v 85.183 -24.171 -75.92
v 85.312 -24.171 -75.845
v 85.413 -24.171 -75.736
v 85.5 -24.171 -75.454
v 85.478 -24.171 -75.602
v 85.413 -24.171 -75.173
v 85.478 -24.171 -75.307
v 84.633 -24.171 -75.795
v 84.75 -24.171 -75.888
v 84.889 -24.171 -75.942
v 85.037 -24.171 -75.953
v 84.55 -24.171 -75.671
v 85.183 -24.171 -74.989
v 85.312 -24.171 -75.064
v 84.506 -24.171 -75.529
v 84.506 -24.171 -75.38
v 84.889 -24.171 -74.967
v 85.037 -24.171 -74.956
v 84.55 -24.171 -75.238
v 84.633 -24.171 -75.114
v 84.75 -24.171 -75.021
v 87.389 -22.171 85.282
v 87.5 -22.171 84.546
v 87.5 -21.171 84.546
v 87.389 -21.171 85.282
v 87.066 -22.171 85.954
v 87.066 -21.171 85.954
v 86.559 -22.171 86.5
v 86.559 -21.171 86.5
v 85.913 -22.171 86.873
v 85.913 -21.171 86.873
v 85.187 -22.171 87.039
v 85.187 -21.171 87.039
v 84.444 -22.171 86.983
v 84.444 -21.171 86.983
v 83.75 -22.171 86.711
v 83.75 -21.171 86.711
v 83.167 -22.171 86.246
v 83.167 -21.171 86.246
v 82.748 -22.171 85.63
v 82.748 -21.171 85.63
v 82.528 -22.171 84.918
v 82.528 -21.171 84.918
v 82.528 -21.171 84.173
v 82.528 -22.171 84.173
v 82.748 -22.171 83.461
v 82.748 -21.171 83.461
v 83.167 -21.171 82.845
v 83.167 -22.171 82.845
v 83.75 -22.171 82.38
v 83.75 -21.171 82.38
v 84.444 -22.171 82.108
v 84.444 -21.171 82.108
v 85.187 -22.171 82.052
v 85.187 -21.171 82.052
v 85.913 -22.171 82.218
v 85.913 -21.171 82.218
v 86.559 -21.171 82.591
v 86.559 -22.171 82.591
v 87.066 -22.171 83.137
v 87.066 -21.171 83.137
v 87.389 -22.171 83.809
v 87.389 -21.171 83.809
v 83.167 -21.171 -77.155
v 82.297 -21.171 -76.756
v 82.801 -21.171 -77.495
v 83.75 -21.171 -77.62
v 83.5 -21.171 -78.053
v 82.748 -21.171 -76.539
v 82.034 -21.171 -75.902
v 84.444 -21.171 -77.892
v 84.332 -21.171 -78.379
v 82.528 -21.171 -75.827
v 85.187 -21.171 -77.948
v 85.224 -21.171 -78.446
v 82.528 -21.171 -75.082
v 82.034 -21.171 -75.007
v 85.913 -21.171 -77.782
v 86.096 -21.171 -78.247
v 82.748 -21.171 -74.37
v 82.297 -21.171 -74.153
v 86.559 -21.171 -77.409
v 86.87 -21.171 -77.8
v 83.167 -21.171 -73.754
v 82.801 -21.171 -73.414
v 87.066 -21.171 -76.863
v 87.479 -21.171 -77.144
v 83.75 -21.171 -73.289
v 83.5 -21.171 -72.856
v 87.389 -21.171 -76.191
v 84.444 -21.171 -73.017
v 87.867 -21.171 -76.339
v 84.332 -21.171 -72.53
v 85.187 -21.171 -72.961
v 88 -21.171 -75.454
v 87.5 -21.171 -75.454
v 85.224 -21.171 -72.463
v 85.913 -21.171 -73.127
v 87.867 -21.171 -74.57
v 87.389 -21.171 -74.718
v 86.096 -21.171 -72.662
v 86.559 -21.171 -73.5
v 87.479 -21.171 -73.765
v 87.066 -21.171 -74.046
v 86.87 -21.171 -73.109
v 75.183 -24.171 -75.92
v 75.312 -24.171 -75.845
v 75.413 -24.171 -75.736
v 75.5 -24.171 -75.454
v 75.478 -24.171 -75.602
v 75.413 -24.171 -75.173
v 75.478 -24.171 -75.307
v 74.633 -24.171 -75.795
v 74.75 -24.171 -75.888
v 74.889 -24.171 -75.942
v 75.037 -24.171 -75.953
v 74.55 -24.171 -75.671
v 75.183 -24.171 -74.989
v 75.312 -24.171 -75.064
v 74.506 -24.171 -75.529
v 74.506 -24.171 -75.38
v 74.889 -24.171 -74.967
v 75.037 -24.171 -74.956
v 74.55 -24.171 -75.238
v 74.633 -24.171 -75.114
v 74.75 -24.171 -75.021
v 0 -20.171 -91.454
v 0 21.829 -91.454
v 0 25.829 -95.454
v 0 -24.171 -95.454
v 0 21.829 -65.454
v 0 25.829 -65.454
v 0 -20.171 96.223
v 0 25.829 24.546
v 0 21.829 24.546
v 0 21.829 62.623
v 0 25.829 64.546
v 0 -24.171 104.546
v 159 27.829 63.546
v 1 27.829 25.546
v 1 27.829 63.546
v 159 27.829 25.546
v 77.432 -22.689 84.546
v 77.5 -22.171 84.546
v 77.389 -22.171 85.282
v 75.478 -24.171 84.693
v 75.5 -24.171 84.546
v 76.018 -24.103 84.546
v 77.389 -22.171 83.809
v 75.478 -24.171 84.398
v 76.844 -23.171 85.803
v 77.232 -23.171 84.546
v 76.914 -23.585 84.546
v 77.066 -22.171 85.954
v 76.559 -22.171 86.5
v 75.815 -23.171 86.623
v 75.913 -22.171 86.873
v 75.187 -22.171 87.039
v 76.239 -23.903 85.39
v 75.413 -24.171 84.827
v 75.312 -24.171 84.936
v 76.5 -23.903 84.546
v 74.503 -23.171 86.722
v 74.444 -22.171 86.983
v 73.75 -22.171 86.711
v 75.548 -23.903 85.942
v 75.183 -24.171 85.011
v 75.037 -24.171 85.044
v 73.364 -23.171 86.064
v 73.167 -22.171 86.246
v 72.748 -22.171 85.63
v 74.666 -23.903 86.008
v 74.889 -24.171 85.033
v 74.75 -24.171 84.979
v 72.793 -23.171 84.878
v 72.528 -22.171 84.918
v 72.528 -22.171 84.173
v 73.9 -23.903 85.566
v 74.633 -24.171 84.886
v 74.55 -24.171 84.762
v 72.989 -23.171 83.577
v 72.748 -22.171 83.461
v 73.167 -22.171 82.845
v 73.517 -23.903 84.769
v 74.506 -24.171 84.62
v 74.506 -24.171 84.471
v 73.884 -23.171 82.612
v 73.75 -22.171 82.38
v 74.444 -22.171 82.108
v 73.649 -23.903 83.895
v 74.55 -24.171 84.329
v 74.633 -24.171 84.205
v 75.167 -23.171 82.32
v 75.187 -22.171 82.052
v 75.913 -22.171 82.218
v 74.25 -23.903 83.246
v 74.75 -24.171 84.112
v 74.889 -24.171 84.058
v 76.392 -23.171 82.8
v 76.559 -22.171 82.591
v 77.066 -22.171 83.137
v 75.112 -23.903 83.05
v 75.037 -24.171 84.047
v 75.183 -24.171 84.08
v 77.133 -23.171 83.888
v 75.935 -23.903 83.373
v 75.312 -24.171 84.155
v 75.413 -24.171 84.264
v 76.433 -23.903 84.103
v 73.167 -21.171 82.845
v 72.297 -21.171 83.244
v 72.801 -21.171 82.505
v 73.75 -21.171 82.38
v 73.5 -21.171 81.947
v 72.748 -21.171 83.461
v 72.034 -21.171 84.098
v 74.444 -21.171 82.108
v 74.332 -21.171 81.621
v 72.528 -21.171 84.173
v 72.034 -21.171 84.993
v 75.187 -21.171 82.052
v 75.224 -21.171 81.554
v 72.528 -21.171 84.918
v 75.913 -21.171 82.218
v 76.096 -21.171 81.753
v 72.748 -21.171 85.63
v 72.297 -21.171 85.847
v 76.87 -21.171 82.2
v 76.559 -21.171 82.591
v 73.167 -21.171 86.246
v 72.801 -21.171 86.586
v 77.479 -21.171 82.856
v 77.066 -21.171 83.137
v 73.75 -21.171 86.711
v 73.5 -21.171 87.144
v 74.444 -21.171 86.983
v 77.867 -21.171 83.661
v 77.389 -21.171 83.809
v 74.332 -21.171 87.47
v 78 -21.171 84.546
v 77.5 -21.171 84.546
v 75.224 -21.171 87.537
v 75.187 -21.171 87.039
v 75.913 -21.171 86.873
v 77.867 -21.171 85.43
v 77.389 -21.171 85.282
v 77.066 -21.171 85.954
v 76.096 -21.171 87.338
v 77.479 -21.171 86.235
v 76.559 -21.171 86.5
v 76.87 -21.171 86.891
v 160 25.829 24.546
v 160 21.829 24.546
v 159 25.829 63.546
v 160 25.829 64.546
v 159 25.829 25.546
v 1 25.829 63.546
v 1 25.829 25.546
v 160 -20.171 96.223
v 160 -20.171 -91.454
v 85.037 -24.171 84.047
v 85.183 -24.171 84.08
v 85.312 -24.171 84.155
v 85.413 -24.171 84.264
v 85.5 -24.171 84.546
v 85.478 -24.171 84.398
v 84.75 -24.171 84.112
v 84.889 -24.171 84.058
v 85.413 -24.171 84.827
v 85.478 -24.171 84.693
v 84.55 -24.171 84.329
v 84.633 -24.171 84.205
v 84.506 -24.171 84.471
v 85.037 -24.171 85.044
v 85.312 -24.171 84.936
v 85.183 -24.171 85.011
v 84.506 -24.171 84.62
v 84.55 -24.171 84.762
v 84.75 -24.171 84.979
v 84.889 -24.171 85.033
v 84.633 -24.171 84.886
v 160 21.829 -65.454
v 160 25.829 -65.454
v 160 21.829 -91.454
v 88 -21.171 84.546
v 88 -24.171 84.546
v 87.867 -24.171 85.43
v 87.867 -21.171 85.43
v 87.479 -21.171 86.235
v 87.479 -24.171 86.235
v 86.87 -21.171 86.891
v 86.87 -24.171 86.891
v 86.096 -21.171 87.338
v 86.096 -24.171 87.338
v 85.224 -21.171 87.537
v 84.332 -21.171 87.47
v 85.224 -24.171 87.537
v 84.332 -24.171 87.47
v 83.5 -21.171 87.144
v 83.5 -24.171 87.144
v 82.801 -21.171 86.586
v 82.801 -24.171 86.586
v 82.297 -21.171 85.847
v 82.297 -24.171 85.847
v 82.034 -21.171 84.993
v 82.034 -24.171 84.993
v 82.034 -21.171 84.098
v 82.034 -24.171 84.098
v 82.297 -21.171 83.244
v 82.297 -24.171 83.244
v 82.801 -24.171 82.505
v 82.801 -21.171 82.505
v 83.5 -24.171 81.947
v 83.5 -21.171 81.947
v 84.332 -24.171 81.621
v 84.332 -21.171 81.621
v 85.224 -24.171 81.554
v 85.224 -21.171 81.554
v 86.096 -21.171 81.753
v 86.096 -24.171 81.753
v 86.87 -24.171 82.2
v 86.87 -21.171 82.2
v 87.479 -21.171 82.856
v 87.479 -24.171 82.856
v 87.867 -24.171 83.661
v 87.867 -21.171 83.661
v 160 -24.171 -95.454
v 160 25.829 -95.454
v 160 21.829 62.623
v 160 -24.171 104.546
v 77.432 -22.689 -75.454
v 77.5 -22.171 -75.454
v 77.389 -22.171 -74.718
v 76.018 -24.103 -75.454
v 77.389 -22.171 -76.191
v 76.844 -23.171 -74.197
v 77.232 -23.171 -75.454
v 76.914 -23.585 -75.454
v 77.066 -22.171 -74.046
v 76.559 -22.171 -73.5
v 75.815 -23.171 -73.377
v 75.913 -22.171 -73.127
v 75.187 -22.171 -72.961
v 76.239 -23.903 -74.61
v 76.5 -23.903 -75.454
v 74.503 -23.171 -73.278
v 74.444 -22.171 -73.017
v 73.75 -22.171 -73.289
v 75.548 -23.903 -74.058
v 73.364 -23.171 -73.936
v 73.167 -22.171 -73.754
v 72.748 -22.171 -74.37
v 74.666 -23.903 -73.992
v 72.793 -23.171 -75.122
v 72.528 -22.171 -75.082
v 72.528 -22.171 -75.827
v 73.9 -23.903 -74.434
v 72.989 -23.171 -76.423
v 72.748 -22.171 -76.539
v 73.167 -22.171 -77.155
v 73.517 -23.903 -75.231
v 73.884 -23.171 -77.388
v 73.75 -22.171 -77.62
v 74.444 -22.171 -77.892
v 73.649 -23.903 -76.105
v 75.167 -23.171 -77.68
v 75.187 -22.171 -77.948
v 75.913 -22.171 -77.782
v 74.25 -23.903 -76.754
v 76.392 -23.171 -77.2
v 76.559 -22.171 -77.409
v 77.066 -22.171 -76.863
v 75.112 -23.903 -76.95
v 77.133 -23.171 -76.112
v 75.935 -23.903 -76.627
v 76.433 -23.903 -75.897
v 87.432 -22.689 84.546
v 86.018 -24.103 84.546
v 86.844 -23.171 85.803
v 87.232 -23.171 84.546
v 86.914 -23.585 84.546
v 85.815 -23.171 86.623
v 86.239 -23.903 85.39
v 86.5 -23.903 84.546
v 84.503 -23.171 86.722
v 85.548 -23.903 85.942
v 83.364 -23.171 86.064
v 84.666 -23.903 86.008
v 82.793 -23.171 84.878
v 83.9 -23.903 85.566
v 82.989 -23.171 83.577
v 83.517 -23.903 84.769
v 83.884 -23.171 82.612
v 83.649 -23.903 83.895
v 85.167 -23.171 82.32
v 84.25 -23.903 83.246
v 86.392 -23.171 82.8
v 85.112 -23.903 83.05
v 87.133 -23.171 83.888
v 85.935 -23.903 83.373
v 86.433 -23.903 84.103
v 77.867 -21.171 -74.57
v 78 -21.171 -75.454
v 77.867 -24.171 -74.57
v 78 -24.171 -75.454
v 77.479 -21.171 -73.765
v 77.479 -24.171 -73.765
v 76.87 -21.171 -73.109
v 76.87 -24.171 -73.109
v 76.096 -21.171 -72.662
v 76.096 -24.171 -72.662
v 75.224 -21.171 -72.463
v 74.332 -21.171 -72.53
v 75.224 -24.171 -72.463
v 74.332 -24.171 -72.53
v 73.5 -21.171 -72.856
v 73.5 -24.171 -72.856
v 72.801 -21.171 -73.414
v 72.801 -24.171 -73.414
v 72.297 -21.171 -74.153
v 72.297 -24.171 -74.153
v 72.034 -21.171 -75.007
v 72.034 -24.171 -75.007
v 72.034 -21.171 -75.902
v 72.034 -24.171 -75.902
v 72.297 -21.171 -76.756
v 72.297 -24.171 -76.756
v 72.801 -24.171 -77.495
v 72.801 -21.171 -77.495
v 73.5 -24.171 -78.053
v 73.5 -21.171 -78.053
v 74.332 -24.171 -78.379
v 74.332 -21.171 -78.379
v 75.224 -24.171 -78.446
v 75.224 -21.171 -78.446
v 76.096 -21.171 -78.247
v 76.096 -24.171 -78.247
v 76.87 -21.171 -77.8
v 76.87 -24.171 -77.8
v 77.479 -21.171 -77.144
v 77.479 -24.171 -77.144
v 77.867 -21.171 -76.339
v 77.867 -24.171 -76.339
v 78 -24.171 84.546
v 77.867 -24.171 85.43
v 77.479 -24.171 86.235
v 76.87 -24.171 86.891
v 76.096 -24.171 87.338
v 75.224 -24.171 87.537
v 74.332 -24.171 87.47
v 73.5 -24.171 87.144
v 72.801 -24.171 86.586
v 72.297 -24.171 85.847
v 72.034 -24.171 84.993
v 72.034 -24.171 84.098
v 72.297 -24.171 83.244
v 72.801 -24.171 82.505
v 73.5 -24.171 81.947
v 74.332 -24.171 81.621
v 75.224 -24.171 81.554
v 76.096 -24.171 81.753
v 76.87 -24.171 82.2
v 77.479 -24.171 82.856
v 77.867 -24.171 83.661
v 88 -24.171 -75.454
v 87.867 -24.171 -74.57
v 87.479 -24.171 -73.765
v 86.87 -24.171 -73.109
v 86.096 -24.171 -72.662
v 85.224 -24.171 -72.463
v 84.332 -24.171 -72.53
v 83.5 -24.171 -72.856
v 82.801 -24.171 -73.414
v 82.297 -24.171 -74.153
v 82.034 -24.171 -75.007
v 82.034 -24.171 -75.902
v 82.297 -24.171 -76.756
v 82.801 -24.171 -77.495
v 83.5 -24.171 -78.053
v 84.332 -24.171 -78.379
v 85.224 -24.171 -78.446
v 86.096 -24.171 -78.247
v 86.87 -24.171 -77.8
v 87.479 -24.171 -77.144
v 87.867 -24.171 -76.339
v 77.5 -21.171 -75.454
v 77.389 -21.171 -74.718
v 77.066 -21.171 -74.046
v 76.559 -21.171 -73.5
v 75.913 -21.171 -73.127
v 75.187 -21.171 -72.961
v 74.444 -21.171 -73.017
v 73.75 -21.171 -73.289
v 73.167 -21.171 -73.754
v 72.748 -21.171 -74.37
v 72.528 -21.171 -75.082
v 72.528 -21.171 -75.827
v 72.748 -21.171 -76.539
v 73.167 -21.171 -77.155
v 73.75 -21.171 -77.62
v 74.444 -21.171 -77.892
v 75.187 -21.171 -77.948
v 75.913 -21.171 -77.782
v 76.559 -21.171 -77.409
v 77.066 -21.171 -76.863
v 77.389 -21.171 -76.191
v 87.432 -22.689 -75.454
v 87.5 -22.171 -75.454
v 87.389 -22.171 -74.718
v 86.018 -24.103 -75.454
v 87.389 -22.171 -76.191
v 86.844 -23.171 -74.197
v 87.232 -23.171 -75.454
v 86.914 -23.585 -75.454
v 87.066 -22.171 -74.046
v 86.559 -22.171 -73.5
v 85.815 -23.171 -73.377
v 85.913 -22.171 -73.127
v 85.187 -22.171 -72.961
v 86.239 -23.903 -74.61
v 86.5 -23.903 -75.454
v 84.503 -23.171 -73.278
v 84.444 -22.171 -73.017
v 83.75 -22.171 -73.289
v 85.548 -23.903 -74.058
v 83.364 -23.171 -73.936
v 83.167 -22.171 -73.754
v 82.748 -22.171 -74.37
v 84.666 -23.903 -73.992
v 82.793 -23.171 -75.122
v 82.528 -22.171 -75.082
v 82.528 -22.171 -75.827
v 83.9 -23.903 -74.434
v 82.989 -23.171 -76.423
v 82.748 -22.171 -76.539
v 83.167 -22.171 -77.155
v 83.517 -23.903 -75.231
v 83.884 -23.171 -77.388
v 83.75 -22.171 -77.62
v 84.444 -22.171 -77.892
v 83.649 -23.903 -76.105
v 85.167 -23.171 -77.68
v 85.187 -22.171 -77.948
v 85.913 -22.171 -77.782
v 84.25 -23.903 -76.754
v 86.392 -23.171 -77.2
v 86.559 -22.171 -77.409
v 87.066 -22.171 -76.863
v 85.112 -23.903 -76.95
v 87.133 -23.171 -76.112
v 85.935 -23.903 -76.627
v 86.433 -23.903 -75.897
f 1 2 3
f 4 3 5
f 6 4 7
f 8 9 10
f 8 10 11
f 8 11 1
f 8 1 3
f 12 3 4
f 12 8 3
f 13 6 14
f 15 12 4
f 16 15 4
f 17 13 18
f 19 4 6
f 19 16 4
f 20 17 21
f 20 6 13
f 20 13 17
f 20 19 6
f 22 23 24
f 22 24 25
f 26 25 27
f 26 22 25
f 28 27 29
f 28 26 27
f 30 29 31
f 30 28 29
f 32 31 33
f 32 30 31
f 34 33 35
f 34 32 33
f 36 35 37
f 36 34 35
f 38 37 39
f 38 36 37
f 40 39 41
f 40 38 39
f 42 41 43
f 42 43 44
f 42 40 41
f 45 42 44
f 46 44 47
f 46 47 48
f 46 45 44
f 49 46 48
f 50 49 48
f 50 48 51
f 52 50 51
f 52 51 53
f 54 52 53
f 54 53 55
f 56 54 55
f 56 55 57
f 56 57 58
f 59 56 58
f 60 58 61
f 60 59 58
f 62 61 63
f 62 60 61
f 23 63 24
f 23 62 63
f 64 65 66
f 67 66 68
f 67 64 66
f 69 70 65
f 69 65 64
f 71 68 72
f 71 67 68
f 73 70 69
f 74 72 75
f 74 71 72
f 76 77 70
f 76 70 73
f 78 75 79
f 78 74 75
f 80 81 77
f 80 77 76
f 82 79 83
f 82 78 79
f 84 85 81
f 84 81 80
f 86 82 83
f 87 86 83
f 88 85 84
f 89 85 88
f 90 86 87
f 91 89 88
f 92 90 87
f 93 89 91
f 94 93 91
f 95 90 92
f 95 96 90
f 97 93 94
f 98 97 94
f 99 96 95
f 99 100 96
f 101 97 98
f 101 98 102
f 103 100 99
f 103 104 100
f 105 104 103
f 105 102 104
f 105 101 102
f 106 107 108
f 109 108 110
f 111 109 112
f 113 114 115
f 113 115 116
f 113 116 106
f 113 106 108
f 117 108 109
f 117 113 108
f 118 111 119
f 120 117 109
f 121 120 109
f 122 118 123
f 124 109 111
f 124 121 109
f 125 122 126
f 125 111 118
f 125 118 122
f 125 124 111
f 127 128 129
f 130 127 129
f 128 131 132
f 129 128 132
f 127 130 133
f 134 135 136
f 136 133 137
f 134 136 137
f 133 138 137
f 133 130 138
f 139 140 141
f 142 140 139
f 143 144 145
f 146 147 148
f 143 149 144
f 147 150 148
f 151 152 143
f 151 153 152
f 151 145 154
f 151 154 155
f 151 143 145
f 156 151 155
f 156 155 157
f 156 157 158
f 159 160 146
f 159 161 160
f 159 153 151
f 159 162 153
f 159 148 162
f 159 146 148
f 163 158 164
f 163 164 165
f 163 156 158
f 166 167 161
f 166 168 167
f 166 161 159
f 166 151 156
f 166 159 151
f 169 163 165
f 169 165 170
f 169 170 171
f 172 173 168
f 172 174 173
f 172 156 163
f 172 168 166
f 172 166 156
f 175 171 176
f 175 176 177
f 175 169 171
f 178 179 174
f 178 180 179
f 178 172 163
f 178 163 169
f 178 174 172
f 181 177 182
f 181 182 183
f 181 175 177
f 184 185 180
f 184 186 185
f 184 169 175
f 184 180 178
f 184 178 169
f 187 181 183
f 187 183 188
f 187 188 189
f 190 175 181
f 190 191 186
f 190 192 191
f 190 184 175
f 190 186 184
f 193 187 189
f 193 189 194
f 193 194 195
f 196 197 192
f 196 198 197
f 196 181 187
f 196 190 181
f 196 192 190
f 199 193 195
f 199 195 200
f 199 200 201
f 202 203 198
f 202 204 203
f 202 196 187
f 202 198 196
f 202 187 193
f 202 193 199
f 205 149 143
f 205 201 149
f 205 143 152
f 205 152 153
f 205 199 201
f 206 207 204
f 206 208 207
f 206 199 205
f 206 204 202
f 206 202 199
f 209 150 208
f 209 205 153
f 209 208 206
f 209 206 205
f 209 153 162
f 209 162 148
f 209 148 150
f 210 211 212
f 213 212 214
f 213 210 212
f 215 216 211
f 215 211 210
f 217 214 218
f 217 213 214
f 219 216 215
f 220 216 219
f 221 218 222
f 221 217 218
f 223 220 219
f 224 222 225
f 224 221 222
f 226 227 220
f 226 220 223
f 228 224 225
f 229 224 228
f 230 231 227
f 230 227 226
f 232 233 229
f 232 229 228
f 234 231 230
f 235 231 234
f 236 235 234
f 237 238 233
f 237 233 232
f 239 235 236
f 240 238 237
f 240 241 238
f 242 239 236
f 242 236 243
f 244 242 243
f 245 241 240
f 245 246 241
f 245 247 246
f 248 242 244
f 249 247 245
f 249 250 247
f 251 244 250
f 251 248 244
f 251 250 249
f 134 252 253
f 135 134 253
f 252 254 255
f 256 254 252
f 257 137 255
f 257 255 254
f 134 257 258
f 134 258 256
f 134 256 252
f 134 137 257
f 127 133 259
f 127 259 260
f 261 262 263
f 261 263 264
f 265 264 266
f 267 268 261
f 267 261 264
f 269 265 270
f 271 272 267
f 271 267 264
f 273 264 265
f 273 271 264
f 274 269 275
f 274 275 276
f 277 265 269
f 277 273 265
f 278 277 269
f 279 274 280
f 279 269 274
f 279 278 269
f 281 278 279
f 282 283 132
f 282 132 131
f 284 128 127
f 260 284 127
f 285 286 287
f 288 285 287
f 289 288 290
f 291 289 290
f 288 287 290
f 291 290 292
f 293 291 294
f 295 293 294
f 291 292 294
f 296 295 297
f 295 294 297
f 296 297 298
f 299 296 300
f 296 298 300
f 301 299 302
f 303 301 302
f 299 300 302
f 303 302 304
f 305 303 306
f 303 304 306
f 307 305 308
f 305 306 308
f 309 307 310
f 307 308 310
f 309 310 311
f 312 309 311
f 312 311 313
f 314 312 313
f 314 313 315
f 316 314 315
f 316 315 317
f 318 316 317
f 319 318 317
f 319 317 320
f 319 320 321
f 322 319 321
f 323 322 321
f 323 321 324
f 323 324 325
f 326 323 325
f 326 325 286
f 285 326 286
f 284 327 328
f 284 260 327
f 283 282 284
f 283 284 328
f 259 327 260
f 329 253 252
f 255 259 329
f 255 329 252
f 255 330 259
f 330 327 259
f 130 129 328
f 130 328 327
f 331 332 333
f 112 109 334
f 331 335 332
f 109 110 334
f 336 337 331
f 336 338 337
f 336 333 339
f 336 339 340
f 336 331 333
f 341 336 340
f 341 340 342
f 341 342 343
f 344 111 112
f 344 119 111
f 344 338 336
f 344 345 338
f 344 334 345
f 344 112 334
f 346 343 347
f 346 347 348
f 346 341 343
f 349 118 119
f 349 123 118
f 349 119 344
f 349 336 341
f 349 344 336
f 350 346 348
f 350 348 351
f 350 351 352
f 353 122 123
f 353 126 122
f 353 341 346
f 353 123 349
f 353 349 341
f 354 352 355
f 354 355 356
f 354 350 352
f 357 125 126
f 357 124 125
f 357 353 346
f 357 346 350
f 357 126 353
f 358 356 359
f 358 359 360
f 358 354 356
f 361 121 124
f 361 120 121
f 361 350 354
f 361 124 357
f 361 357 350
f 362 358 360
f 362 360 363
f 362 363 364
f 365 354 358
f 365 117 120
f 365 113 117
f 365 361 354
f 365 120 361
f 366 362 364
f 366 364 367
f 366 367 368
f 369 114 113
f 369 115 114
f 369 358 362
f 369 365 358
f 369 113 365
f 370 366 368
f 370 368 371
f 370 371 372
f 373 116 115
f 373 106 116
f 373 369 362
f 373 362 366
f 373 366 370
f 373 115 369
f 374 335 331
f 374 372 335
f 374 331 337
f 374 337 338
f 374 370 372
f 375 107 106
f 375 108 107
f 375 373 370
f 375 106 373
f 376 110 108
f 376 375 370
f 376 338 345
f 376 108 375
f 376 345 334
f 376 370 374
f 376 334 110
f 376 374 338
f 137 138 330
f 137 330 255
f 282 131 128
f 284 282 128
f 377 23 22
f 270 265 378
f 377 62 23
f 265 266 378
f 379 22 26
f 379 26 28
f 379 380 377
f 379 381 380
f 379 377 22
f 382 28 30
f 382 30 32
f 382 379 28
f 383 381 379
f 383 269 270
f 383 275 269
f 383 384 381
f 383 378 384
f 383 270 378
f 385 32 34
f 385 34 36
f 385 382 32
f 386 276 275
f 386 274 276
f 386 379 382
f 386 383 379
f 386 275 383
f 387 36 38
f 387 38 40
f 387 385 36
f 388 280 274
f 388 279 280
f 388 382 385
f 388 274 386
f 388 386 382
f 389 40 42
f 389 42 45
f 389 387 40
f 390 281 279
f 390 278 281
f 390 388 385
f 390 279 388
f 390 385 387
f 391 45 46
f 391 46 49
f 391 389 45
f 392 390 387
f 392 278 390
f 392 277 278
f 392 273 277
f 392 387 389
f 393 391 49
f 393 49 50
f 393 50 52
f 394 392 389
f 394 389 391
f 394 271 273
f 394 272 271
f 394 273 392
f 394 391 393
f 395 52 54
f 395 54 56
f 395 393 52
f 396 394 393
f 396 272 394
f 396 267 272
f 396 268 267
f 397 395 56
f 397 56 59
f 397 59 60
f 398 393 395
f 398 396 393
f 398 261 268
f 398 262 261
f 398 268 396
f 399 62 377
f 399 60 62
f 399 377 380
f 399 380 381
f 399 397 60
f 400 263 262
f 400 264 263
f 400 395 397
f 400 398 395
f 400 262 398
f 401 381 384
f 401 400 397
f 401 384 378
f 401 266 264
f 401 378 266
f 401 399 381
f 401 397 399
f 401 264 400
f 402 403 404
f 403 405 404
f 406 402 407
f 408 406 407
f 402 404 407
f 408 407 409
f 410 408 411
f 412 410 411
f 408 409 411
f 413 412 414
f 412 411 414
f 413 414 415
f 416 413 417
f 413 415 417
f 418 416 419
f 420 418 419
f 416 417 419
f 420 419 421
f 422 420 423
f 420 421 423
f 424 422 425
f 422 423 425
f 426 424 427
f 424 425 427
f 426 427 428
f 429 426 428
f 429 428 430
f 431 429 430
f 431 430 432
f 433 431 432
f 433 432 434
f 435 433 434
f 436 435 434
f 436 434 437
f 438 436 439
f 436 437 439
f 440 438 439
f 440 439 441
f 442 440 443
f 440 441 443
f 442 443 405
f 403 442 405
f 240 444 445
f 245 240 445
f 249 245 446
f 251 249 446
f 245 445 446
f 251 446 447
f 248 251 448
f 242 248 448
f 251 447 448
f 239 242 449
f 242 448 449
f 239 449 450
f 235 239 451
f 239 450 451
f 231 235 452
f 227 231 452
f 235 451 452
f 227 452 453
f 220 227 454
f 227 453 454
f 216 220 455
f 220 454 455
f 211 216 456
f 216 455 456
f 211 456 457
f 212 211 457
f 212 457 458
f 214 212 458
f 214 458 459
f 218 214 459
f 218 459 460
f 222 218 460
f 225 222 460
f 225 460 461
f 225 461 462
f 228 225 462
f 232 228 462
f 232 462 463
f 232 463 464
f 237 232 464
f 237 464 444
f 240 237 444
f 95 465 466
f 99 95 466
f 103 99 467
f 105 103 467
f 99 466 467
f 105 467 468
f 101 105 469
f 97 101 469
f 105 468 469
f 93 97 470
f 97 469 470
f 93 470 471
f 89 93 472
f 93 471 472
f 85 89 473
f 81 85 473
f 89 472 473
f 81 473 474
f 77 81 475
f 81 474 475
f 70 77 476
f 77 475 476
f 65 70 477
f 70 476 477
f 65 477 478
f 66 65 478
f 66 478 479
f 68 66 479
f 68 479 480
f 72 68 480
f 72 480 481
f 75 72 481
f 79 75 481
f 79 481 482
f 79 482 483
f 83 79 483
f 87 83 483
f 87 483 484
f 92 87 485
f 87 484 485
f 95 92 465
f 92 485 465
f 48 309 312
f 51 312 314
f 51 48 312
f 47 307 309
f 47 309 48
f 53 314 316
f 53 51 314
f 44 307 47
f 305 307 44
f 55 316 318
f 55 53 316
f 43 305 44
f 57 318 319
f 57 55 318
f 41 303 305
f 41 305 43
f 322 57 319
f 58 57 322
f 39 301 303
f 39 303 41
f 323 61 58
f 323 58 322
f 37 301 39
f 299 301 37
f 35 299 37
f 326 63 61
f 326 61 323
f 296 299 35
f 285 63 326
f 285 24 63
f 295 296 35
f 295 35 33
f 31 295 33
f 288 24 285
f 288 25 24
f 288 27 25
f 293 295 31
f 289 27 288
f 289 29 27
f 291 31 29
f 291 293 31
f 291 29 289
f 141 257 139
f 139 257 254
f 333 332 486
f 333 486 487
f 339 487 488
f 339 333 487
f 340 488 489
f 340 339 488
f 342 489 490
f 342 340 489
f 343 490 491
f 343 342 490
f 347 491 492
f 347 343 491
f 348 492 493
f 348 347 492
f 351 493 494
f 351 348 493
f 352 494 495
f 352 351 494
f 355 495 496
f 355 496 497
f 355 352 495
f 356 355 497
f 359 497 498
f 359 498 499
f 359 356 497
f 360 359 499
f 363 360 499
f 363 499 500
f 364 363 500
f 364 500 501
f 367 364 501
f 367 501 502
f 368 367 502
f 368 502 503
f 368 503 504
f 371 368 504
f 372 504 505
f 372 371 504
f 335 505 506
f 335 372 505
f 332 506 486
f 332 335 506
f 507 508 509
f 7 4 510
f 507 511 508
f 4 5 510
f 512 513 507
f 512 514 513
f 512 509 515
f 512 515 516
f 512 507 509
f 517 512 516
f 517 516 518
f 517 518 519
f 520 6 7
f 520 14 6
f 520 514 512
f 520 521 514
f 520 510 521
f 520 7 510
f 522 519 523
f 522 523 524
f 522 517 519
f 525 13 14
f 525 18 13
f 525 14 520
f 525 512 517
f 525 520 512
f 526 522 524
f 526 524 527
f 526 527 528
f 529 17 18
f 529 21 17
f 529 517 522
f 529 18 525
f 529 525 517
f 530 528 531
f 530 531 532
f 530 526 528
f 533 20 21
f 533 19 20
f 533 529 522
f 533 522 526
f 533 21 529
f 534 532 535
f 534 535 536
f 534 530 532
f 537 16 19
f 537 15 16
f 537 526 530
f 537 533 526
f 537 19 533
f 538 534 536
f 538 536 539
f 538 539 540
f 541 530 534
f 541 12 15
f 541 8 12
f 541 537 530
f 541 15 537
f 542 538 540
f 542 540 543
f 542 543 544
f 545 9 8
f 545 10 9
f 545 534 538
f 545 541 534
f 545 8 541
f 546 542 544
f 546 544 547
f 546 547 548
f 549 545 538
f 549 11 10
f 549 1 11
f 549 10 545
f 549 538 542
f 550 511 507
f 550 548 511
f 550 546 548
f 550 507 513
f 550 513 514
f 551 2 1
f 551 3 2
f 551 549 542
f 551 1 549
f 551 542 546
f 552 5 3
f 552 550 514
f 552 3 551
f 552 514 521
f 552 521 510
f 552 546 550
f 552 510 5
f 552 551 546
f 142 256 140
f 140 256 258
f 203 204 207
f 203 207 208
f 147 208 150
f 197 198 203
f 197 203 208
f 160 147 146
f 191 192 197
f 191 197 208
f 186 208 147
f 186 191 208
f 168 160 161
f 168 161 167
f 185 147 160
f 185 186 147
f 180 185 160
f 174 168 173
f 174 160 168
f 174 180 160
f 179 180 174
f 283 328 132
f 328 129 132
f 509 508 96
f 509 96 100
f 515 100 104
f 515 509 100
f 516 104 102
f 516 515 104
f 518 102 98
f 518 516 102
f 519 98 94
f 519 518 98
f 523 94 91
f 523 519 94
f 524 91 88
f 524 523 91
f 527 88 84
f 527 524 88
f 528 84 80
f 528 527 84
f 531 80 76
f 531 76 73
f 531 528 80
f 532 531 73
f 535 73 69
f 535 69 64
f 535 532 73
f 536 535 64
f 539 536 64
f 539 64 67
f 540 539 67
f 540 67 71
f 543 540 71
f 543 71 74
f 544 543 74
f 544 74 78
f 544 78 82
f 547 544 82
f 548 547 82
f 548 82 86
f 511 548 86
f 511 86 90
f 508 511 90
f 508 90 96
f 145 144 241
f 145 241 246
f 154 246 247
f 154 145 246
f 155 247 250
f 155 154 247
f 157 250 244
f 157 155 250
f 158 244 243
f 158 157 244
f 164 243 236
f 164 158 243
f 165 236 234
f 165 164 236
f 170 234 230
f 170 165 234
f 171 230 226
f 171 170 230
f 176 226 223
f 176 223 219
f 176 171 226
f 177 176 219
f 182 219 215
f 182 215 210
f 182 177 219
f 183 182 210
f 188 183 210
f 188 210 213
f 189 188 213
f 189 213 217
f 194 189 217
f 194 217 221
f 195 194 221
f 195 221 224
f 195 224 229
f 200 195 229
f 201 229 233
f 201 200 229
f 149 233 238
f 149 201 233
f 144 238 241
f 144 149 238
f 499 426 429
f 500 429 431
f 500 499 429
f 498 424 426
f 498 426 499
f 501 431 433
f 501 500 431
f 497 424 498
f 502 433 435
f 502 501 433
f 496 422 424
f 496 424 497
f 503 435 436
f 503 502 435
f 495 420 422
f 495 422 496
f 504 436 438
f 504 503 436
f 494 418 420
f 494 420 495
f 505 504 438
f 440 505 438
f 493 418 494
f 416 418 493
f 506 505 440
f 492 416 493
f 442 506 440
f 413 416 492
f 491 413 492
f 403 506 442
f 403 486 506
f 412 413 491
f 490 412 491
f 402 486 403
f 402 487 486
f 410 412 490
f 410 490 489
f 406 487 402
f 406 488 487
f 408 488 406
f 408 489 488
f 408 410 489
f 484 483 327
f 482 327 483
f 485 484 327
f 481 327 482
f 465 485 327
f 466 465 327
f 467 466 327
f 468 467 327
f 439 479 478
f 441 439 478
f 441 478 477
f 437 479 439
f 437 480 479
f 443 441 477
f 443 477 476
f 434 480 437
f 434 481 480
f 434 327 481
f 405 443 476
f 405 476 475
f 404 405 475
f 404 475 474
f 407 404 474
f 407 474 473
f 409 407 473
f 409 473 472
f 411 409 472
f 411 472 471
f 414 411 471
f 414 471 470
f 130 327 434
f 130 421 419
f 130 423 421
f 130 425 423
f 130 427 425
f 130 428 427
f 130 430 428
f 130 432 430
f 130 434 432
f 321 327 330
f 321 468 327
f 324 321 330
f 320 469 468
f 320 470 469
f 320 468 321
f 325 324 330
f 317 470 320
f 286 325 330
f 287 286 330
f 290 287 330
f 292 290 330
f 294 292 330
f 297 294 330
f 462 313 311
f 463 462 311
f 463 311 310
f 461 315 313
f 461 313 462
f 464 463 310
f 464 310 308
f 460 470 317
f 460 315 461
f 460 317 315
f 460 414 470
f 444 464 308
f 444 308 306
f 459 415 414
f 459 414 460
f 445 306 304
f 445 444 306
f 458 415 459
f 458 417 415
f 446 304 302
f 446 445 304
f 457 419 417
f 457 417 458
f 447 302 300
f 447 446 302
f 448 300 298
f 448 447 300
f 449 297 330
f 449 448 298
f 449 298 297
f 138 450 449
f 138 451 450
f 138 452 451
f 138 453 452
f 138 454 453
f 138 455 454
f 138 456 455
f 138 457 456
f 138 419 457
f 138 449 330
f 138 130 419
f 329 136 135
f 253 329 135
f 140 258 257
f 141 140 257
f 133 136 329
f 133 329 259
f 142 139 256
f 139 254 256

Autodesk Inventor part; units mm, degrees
ref_plane "YZ Plane" through (0, 0, 0) normal (1, 0, 0) x (0, 1, 0)
ref_plane "XZ Plane" through (0, 0, 0) normal (0, 1, 0) x (-1, 0, 0)
ref_plane "XY Plane" through (0, 0, 0) normal (0, 0, 1) x (1, 0, 0)
sketch "Sketch1" plane through (0, 0, 0) normal (1, 0, 0) x (0, 1, 0)
  point P0 (0, 0)
sketch "Sketch2" plane through (0, 0, 0) normal (1, 0, 0) x (0, 1, 0)
  line L0 (25.8289, -95.4545) -> (-24.1711, -95.4545)
  line L1 (-24.1711, -95.4545) -> (-24.1711, 104.5455)
  line L2 (-24.1711, 104.5455) -> (25.8289, 64.5455)
  line L3 (25.8289, 64.5455) -> (25.8289, 24.5455)
  line L4 (25.8289, -95.4545) -> (25.8289, -65.4545)
  line L5 (21.8289, -91.4545) -> (-20.1711, -91.4545)
  line L6 (-20.1711, -91.4545) -> (-20.1711, 24.5455)
  line L7 (21.8289, 62.623) -> (-20.1711, 96.223)
  line L8 (-20.1711, 96.223) -> (-20.1711, 24.5455)
  line L9 (25.8289, 24.5455) -> (21.8289, 24.5455)
  line L10 (25.8289, -65.4545) -> (21.8289, -65.4545)
  line L11 (21.8289, 62.623) -> (21.8289, 24.5455)
  line L12 (21.8289, -65.4545) -> (21.8289, -91.4545)
  point P0 (0, 0)
  dimension "d3" = 200
  dimension "d4" = 40
  dimension "d5" = 50
  dimension "d6" = 30
  dimension "d7" = 40
  dimension "d9" = 51.34
  dimension "d10" = 4
  dimension "d12" = 4
  dimension "d14" = 4
  dimension "d15" = 4
  dimension "d16" = 4
  dimension "d17" = 4
  dimension "d18" = 4
extrude "Extrusion1" add sketch "Sketch2" along normal blind 160
sketch "Sketch3" plane through (0, 25.8289, 64.5455) normal (0, 1, 0) x (1, 0, 0)
  line L0 (1, 1) -> (159, 1)
  line L1 (159, 1) -> (159, 39)
  line L2 (159, 39) -> (1, 39)
  line L3 (1, 39) -> (1, 1)
  line L4 (0, 40) -> (0, 0) projected
  line L5 (0, 40) -> (160, 40) projected
  line L6 (0, 0) -> (160, 0) projected
  line L7 (160, 40) -> (160, 0) projected
  point P0 (0, 64.5455)
  dimension "d21" = 1
  dimension "d22" = 1
  dimension "d23" = 1
  dimension "d24" = 1
extrude "Extrusion2" add sketch "Sketch3" along normal blind 2 contours L3 L2 L1 L0
sketch "Sketch5" plane through (0, 0, 0) normal (-1, 0, 0) x (0, 0, 1)
  point P0 (0, 0)
sketch "Sketch6" plane through (0, -24.1711, -95.4545) normal (0, -1, 0) x (1, 0, 0)
  circle A0 centre (75, 180) radius 2.5
  circle A1 centre (75, 180) radius 3
  line L0 (0, 200) -> (160, 200) projected
  line L1 (0, 200) -> (0, 0) projected
  circle A2 centre (85, 180) radius 2.5
  circle A3 centre (85, 180) radius 3
  circle A4 centre (85, 20) radius 2.5
  circle A5 centre (85, 20) radius 3
  circle A6 centre (75, 20) radius 2.5
  circle A7 centre (75, 20) radius 3
  line L2 (160, 200) -> (160, 0) projected
  line L3 (0, 0) -> (160, 0) projected
  point P0 (0, 95.4545)
  dimension "d33" = 5
  dimension "d34" = 6
  dimension "d35" = 20
  dimension "d36" = 75
  dimension "d37" = 5
  dimension "d38" = 6
  dimension "d39" = 5
  dimension "d40" = 6
  dimension "d41" = 5
  dimension "d42" = 6
  dimension "d43" = 75
  dimension "d44" = 20
  dimension "d45" = 20
  dimension "d46" = 20
  dimension "d47" = 75
  dimension "d48" = 75
extrude "Extrusion4" cut sketch "Sketch6" against normal blind 3 contours A1 | A3 | A5 | A7
fillet "Fillet1" radius 2 4 edges at (72.5, -24.1711, -75.4545) (82.5, -24.1711, -75.4545) (72.5, -24.1711, 84.5455) (82.5, -24.1711, 84.5455)
properties part number "Bottom Plastic"
